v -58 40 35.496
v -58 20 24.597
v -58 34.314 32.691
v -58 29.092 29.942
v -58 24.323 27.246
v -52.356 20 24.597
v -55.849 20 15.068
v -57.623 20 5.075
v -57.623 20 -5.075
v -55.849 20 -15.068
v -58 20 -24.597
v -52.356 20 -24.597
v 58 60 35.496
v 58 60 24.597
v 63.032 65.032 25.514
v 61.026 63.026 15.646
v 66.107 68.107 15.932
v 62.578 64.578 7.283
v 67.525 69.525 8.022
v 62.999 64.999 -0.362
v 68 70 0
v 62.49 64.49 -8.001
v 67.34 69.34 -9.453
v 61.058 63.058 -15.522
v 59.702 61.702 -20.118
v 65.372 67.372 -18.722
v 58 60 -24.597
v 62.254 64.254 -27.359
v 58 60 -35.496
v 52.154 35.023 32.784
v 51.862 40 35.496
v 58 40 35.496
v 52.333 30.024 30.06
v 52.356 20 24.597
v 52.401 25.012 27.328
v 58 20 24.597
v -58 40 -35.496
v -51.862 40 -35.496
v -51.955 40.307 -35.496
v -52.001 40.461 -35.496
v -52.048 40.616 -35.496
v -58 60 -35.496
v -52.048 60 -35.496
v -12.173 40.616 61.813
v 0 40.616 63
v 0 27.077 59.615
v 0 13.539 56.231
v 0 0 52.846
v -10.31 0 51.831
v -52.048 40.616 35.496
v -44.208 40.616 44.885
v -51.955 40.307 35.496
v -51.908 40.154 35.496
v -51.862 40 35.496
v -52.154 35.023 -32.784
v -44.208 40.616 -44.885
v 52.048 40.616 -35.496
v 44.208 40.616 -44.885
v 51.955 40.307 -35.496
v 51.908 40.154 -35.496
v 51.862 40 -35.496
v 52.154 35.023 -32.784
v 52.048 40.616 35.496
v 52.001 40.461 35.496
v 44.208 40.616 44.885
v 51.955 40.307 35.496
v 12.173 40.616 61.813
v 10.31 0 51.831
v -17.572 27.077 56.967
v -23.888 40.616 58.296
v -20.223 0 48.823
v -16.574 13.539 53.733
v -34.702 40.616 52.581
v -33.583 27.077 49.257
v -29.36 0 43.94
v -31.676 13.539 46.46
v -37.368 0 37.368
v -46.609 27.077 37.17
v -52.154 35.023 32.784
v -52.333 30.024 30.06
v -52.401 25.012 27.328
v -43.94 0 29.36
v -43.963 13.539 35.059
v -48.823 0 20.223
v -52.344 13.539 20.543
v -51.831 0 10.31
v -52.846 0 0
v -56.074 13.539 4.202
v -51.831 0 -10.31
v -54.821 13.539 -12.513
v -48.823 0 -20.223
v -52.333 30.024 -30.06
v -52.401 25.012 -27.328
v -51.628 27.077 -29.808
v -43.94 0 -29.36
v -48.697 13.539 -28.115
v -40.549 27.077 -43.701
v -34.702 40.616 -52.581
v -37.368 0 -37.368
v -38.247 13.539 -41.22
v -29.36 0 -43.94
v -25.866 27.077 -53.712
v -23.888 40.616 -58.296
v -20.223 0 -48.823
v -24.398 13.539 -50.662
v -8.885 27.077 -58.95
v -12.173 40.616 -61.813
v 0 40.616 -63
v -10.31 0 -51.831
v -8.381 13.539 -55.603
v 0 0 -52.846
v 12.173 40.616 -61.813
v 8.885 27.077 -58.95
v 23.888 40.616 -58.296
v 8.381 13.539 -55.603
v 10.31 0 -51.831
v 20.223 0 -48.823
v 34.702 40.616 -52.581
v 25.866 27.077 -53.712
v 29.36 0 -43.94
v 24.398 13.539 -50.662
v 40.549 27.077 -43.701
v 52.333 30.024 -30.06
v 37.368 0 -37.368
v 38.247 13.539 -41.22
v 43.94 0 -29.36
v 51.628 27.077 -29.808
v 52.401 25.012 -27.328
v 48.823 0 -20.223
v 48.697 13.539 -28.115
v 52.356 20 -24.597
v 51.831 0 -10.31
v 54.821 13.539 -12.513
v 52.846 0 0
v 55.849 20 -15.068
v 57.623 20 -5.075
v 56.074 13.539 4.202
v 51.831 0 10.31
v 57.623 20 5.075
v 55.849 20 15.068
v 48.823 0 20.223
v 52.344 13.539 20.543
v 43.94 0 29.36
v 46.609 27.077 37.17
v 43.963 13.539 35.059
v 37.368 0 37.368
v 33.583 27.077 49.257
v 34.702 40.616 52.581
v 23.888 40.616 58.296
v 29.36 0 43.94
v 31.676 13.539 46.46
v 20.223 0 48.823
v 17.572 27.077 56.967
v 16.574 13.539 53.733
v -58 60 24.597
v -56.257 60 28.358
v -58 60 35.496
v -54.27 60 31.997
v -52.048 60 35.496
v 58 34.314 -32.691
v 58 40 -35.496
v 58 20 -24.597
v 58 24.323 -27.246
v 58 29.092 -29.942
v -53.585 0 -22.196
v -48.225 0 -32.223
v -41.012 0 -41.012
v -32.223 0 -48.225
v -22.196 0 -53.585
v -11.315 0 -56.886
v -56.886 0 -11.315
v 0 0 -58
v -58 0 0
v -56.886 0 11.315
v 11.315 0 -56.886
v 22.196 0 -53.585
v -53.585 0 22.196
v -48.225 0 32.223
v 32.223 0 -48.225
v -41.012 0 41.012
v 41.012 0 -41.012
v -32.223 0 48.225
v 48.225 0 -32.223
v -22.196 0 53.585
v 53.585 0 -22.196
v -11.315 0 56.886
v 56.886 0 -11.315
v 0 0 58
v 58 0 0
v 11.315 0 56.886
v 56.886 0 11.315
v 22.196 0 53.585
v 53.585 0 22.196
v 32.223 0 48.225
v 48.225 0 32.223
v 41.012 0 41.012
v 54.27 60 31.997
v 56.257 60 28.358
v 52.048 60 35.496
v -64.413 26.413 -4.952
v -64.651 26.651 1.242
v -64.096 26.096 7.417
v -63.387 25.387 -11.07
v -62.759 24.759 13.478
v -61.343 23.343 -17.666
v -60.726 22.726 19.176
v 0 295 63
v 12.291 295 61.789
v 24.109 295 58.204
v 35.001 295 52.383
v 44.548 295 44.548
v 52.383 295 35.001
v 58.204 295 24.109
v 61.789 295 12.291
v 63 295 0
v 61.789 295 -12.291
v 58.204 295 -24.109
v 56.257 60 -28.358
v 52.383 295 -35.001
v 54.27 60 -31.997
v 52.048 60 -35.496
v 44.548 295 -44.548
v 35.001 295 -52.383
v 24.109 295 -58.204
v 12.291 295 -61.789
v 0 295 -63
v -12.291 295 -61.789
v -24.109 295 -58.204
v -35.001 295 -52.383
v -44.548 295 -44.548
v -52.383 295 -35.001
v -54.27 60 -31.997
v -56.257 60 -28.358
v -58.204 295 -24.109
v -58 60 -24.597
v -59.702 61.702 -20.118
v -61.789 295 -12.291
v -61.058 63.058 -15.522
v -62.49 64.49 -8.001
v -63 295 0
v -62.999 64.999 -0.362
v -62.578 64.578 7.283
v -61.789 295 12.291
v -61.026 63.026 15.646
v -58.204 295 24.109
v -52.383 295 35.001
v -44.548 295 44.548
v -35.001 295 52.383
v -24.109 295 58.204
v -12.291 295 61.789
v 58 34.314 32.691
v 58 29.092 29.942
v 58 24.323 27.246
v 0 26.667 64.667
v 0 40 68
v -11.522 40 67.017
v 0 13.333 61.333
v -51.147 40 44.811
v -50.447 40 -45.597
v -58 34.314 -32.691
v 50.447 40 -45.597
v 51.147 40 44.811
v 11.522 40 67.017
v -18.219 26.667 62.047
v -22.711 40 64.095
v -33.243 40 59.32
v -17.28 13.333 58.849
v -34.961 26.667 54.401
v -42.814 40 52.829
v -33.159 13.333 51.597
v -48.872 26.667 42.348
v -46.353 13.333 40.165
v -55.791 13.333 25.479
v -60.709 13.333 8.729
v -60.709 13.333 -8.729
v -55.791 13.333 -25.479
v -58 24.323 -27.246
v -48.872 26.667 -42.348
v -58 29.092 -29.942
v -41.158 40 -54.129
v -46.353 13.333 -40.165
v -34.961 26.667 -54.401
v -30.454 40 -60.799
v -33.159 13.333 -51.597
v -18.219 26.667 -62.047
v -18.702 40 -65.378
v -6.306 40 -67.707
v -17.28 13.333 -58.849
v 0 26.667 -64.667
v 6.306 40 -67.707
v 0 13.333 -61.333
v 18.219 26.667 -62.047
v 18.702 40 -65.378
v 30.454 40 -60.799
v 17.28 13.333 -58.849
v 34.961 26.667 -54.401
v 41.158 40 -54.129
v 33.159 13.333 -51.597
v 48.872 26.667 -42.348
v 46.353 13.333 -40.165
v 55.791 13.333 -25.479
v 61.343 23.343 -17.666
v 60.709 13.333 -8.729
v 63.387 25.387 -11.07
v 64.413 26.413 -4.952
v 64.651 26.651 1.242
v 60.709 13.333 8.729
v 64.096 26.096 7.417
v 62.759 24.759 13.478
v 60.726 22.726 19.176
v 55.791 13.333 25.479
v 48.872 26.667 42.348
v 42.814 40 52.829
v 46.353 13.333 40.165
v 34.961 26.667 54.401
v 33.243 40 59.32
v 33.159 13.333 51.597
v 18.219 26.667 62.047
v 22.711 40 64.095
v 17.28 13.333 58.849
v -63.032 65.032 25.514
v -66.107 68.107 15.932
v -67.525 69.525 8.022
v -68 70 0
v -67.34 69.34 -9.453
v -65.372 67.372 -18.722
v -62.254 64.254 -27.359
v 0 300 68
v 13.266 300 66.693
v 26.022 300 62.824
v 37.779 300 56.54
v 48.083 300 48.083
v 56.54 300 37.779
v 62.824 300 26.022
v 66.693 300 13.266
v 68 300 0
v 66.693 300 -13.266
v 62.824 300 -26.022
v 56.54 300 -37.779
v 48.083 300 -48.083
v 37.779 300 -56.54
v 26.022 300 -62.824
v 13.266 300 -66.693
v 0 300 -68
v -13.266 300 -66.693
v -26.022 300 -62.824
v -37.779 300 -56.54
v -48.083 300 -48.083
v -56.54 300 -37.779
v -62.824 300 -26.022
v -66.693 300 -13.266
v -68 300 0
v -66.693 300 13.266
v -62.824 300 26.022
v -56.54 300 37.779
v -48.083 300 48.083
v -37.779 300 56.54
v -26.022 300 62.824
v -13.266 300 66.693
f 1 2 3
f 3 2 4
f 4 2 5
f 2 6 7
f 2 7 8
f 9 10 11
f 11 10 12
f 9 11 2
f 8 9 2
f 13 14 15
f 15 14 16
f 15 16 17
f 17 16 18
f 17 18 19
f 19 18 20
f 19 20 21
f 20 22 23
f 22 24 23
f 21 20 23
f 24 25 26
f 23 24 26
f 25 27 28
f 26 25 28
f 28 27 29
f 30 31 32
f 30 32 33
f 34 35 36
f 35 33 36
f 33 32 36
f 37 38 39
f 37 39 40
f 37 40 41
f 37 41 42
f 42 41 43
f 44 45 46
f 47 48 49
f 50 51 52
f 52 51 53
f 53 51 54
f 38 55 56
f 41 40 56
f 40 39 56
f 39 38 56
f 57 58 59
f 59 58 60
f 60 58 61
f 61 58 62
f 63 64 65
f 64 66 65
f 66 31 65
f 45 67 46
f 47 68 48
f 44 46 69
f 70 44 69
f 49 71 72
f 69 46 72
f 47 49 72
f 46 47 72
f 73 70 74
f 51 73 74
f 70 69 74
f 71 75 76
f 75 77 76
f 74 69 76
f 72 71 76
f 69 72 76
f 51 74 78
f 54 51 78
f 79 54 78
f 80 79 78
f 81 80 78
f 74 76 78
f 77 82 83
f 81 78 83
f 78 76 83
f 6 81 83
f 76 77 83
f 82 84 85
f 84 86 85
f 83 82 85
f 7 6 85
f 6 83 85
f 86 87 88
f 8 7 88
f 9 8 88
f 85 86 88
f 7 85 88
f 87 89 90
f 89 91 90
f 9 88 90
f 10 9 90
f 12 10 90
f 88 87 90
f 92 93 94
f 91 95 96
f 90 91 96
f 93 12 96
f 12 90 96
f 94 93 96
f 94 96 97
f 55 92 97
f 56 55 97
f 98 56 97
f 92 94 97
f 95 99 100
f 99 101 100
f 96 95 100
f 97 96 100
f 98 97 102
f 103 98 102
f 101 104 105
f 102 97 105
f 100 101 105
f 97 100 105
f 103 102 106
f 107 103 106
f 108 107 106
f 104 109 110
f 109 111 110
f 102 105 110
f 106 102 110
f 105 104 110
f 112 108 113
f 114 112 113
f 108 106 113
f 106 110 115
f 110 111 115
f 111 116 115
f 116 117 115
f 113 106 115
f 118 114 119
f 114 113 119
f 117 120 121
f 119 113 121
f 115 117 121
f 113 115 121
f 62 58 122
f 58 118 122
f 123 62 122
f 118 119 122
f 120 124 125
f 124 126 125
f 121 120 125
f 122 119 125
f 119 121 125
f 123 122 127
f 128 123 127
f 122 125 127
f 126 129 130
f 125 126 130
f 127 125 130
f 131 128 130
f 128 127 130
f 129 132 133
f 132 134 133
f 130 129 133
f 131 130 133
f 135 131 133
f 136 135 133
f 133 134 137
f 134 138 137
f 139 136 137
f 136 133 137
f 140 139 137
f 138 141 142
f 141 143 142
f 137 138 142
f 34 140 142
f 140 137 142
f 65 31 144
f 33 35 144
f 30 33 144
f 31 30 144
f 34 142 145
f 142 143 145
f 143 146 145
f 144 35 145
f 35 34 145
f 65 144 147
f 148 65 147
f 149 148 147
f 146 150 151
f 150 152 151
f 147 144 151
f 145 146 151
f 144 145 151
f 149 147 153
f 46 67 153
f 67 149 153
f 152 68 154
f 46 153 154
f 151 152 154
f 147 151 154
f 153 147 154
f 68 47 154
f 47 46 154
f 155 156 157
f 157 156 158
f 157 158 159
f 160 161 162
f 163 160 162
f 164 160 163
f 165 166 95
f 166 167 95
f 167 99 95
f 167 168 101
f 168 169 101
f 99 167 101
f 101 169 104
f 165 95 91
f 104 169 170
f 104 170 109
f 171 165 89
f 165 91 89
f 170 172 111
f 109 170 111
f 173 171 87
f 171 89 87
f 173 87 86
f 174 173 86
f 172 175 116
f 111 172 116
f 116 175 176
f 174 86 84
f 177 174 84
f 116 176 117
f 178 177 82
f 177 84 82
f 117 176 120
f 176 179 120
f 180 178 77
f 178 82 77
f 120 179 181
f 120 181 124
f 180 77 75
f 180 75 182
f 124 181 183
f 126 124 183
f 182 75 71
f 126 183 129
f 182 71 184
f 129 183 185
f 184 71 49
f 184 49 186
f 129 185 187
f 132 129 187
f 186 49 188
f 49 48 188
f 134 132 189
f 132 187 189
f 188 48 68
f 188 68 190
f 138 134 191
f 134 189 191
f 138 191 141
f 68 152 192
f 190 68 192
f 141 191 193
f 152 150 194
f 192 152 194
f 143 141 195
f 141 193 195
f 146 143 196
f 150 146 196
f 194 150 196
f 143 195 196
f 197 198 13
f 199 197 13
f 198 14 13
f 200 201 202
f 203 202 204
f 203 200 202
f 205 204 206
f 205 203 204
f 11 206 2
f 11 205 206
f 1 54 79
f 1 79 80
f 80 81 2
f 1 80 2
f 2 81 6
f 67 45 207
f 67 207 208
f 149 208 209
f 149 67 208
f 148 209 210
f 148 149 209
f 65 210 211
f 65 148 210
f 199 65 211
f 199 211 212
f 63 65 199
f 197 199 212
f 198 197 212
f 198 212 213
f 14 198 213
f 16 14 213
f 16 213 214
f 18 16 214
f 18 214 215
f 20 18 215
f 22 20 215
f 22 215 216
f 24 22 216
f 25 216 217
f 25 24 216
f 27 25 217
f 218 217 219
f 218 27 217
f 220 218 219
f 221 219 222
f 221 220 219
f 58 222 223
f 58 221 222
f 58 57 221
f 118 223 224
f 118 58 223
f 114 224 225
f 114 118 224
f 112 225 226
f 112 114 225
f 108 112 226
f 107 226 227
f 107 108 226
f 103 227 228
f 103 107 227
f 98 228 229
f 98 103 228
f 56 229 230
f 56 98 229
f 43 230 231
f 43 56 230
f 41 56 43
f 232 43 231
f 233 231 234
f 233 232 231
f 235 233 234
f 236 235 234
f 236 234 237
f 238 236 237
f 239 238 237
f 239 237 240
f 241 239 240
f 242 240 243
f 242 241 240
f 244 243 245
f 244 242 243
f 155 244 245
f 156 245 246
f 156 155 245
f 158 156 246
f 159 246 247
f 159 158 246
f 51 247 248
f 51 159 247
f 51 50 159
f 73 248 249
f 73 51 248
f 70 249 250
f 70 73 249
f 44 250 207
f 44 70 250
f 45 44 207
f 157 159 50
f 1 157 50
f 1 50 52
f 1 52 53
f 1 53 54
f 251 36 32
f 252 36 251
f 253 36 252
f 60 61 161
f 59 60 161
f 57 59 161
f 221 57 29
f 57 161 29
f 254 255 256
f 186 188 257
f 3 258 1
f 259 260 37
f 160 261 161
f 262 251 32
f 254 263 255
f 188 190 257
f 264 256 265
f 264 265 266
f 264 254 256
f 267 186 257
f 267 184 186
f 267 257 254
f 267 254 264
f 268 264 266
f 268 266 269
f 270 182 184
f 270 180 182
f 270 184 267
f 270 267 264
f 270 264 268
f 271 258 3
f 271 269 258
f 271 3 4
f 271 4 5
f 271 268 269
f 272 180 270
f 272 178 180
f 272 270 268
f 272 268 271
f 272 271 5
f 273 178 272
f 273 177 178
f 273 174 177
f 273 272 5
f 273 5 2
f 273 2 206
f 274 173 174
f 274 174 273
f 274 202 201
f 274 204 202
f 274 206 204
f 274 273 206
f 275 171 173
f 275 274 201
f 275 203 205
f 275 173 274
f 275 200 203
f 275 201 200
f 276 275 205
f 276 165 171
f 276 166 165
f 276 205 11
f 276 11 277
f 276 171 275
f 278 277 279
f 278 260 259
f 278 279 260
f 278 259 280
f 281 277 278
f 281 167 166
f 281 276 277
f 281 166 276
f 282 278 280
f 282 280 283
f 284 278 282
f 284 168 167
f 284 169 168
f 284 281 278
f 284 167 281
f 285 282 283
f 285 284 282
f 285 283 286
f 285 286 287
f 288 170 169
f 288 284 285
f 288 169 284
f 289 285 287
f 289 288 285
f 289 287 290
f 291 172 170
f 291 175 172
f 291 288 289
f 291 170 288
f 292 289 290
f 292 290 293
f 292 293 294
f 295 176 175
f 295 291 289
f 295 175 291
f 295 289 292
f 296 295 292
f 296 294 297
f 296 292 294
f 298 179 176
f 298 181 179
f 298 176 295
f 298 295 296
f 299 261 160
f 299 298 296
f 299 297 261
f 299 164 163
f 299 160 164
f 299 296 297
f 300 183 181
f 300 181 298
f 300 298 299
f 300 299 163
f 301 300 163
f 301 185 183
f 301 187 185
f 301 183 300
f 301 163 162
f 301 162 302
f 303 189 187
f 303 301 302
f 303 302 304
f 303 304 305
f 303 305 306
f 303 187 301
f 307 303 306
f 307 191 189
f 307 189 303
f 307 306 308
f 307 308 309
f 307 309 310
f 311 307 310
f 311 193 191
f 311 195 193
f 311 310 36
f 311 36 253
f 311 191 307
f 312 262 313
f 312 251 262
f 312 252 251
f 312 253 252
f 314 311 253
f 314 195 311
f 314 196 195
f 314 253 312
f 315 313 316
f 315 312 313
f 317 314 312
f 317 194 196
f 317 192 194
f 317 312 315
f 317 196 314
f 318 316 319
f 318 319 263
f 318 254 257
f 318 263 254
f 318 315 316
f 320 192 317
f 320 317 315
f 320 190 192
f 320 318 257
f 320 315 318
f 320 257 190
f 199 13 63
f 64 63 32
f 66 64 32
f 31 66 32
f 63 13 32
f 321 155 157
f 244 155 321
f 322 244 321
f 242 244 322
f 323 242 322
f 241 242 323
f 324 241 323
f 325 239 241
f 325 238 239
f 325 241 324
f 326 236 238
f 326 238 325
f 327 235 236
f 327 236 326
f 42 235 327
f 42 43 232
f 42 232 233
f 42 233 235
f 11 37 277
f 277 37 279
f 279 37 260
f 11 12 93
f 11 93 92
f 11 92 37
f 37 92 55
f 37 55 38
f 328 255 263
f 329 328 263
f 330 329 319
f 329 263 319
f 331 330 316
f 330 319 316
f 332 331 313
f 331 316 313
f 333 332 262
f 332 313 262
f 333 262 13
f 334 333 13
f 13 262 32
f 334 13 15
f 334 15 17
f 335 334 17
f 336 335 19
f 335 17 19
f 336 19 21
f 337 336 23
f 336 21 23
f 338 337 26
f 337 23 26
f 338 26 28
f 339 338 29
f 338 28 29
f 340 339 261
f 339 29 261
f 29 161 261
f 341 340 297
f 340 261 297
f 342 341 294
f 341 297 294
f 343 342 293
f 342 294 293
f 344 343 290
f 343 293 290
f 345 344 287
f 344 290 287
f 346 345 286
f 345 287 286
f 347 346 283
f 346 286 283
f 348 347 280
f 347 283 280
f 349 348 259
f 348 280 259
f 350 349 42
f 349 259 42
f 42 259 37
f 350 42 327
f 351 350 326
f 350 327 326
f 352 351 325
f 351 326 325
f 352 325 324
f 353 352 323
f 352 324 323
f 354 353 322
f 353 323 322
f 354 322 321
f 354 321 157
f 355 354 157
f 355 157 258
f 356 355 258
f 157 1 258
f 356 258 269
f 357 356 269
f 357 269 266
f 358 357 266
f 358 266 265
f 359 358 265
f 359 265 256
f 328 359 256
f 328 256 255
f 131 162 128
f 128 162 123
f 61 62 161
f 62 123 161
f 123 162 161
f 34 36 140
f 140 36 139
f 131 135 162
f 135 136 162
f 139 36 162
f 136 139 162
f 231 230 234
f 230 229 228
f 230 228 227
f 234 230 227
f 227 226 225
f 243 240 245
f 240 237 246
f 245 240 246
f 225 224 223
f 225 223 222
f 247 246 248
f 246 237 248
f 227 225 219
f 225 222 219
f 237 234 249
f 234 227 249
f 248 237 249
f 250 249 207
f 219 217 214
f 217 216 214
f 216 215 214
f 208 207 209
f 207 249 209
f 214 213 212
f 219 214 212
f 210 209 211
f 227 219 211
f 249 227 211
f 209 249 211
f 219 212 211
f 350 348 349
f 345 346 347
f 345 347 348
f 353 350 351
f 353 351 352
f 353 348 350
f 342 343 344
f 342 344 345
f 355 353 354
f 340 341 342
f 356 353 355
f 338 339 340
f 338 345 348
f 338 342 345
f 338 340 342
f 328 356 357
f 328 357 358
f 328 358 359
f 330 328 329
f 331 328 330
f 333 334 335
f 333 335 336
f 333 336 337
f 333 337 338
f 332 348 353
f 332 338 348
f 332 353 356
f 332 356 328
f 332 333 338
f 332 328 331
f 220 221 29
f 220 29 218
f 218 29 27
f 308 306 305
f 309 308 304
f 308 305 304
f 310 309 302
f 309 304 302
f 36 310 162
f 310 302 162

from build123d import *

# Parameters (mm, degrees)
SKETCH3_R               = 68
BOSS_EXTRUDE1_DEPTH     = 300
SHELL1_T                = -5
CUT_EXTRUDE1_DEPTH      = 316.036505821
CUT_EXTRUDE1_DEPTH_BACK = 316.036505821
CUT_EXTRUDE2_START      = -116
CUT_EXTRUDE2_DEPTH      = 116


with BuildPart() as part:
    # Sketch3 → Boss-Extrude1 (new body)
    with BuildSketch(Plane(origin=(0, 0, 0), x_dir=(1, 0, 0), z_dir=(0, 1, 0))):
        with Locations(Location((0, 0, 0), (0, 0, 270))):
            Circle(SKETCH3_R)
    extrude(amount=BOSS_EXTRUDE1_DEPTH)

    # Sketch5 → Cut-Revolve1 (revolve, cut)
    with BuildSketch(Plane.XY, mode=Mode.PRIVATE) as cut_revolve1_sk:
        Polygon((-58, 0), (-68, 0), (-68, 40), align=None)
    revolve(cut_revolve1_sk.sketch.rotate(Axis((0, 300, 0), (0, -1, 0)), 270), axis=Axis((0, 300, 0), (0, -1, 0)), mode=Mode.SUBTRACT)

    # Shell1
    shell1_openings = [part.faces().sort_by_distance(p)[0] for p in [
        (0, 0, 0),
    ]]
    offset(amount=SHELL1_T, openings=shell1_openings, kind=Kind.INTERSECTION)

    # Sketch6 → Cut-Extrude1 (cut, two sides: drawn at the far end of the back side and taken through both)
    with BuildSketch(Plane.XY.offset(-CUT_EXTRUDE1_DEPTH_BACK)):
        Polygon((-68, 70), (-68, 30), (-58, 20), (-58, 60), align=None)
        Polygon((68, 30), (58, 20), (58, 60), (68, 70), align=None)
    extrude(amount=CUT_EXTRUDE1_DEPTH + CUT_EXTRUDE1_DEPTH_BACK, mode=Mode.SUBTRACT)

    # Sketch7 → Cut-Extrude2 (cut)
    with BuildSketch(Plane.ZY.offset(58).offset(CUT_EXTRUDE2_START)):
        Polygon((-35.496478699, 60), (35.496478699, 60), (35.496478699, 40), (24.596747752, 20), (-24.596747752, 20), (-35.496478699, 40), align=None)
    extrude(amount=CUT_EXTRUDE2_DEPTH, mode=Mode.SUBTRACT)


solid = part.part
